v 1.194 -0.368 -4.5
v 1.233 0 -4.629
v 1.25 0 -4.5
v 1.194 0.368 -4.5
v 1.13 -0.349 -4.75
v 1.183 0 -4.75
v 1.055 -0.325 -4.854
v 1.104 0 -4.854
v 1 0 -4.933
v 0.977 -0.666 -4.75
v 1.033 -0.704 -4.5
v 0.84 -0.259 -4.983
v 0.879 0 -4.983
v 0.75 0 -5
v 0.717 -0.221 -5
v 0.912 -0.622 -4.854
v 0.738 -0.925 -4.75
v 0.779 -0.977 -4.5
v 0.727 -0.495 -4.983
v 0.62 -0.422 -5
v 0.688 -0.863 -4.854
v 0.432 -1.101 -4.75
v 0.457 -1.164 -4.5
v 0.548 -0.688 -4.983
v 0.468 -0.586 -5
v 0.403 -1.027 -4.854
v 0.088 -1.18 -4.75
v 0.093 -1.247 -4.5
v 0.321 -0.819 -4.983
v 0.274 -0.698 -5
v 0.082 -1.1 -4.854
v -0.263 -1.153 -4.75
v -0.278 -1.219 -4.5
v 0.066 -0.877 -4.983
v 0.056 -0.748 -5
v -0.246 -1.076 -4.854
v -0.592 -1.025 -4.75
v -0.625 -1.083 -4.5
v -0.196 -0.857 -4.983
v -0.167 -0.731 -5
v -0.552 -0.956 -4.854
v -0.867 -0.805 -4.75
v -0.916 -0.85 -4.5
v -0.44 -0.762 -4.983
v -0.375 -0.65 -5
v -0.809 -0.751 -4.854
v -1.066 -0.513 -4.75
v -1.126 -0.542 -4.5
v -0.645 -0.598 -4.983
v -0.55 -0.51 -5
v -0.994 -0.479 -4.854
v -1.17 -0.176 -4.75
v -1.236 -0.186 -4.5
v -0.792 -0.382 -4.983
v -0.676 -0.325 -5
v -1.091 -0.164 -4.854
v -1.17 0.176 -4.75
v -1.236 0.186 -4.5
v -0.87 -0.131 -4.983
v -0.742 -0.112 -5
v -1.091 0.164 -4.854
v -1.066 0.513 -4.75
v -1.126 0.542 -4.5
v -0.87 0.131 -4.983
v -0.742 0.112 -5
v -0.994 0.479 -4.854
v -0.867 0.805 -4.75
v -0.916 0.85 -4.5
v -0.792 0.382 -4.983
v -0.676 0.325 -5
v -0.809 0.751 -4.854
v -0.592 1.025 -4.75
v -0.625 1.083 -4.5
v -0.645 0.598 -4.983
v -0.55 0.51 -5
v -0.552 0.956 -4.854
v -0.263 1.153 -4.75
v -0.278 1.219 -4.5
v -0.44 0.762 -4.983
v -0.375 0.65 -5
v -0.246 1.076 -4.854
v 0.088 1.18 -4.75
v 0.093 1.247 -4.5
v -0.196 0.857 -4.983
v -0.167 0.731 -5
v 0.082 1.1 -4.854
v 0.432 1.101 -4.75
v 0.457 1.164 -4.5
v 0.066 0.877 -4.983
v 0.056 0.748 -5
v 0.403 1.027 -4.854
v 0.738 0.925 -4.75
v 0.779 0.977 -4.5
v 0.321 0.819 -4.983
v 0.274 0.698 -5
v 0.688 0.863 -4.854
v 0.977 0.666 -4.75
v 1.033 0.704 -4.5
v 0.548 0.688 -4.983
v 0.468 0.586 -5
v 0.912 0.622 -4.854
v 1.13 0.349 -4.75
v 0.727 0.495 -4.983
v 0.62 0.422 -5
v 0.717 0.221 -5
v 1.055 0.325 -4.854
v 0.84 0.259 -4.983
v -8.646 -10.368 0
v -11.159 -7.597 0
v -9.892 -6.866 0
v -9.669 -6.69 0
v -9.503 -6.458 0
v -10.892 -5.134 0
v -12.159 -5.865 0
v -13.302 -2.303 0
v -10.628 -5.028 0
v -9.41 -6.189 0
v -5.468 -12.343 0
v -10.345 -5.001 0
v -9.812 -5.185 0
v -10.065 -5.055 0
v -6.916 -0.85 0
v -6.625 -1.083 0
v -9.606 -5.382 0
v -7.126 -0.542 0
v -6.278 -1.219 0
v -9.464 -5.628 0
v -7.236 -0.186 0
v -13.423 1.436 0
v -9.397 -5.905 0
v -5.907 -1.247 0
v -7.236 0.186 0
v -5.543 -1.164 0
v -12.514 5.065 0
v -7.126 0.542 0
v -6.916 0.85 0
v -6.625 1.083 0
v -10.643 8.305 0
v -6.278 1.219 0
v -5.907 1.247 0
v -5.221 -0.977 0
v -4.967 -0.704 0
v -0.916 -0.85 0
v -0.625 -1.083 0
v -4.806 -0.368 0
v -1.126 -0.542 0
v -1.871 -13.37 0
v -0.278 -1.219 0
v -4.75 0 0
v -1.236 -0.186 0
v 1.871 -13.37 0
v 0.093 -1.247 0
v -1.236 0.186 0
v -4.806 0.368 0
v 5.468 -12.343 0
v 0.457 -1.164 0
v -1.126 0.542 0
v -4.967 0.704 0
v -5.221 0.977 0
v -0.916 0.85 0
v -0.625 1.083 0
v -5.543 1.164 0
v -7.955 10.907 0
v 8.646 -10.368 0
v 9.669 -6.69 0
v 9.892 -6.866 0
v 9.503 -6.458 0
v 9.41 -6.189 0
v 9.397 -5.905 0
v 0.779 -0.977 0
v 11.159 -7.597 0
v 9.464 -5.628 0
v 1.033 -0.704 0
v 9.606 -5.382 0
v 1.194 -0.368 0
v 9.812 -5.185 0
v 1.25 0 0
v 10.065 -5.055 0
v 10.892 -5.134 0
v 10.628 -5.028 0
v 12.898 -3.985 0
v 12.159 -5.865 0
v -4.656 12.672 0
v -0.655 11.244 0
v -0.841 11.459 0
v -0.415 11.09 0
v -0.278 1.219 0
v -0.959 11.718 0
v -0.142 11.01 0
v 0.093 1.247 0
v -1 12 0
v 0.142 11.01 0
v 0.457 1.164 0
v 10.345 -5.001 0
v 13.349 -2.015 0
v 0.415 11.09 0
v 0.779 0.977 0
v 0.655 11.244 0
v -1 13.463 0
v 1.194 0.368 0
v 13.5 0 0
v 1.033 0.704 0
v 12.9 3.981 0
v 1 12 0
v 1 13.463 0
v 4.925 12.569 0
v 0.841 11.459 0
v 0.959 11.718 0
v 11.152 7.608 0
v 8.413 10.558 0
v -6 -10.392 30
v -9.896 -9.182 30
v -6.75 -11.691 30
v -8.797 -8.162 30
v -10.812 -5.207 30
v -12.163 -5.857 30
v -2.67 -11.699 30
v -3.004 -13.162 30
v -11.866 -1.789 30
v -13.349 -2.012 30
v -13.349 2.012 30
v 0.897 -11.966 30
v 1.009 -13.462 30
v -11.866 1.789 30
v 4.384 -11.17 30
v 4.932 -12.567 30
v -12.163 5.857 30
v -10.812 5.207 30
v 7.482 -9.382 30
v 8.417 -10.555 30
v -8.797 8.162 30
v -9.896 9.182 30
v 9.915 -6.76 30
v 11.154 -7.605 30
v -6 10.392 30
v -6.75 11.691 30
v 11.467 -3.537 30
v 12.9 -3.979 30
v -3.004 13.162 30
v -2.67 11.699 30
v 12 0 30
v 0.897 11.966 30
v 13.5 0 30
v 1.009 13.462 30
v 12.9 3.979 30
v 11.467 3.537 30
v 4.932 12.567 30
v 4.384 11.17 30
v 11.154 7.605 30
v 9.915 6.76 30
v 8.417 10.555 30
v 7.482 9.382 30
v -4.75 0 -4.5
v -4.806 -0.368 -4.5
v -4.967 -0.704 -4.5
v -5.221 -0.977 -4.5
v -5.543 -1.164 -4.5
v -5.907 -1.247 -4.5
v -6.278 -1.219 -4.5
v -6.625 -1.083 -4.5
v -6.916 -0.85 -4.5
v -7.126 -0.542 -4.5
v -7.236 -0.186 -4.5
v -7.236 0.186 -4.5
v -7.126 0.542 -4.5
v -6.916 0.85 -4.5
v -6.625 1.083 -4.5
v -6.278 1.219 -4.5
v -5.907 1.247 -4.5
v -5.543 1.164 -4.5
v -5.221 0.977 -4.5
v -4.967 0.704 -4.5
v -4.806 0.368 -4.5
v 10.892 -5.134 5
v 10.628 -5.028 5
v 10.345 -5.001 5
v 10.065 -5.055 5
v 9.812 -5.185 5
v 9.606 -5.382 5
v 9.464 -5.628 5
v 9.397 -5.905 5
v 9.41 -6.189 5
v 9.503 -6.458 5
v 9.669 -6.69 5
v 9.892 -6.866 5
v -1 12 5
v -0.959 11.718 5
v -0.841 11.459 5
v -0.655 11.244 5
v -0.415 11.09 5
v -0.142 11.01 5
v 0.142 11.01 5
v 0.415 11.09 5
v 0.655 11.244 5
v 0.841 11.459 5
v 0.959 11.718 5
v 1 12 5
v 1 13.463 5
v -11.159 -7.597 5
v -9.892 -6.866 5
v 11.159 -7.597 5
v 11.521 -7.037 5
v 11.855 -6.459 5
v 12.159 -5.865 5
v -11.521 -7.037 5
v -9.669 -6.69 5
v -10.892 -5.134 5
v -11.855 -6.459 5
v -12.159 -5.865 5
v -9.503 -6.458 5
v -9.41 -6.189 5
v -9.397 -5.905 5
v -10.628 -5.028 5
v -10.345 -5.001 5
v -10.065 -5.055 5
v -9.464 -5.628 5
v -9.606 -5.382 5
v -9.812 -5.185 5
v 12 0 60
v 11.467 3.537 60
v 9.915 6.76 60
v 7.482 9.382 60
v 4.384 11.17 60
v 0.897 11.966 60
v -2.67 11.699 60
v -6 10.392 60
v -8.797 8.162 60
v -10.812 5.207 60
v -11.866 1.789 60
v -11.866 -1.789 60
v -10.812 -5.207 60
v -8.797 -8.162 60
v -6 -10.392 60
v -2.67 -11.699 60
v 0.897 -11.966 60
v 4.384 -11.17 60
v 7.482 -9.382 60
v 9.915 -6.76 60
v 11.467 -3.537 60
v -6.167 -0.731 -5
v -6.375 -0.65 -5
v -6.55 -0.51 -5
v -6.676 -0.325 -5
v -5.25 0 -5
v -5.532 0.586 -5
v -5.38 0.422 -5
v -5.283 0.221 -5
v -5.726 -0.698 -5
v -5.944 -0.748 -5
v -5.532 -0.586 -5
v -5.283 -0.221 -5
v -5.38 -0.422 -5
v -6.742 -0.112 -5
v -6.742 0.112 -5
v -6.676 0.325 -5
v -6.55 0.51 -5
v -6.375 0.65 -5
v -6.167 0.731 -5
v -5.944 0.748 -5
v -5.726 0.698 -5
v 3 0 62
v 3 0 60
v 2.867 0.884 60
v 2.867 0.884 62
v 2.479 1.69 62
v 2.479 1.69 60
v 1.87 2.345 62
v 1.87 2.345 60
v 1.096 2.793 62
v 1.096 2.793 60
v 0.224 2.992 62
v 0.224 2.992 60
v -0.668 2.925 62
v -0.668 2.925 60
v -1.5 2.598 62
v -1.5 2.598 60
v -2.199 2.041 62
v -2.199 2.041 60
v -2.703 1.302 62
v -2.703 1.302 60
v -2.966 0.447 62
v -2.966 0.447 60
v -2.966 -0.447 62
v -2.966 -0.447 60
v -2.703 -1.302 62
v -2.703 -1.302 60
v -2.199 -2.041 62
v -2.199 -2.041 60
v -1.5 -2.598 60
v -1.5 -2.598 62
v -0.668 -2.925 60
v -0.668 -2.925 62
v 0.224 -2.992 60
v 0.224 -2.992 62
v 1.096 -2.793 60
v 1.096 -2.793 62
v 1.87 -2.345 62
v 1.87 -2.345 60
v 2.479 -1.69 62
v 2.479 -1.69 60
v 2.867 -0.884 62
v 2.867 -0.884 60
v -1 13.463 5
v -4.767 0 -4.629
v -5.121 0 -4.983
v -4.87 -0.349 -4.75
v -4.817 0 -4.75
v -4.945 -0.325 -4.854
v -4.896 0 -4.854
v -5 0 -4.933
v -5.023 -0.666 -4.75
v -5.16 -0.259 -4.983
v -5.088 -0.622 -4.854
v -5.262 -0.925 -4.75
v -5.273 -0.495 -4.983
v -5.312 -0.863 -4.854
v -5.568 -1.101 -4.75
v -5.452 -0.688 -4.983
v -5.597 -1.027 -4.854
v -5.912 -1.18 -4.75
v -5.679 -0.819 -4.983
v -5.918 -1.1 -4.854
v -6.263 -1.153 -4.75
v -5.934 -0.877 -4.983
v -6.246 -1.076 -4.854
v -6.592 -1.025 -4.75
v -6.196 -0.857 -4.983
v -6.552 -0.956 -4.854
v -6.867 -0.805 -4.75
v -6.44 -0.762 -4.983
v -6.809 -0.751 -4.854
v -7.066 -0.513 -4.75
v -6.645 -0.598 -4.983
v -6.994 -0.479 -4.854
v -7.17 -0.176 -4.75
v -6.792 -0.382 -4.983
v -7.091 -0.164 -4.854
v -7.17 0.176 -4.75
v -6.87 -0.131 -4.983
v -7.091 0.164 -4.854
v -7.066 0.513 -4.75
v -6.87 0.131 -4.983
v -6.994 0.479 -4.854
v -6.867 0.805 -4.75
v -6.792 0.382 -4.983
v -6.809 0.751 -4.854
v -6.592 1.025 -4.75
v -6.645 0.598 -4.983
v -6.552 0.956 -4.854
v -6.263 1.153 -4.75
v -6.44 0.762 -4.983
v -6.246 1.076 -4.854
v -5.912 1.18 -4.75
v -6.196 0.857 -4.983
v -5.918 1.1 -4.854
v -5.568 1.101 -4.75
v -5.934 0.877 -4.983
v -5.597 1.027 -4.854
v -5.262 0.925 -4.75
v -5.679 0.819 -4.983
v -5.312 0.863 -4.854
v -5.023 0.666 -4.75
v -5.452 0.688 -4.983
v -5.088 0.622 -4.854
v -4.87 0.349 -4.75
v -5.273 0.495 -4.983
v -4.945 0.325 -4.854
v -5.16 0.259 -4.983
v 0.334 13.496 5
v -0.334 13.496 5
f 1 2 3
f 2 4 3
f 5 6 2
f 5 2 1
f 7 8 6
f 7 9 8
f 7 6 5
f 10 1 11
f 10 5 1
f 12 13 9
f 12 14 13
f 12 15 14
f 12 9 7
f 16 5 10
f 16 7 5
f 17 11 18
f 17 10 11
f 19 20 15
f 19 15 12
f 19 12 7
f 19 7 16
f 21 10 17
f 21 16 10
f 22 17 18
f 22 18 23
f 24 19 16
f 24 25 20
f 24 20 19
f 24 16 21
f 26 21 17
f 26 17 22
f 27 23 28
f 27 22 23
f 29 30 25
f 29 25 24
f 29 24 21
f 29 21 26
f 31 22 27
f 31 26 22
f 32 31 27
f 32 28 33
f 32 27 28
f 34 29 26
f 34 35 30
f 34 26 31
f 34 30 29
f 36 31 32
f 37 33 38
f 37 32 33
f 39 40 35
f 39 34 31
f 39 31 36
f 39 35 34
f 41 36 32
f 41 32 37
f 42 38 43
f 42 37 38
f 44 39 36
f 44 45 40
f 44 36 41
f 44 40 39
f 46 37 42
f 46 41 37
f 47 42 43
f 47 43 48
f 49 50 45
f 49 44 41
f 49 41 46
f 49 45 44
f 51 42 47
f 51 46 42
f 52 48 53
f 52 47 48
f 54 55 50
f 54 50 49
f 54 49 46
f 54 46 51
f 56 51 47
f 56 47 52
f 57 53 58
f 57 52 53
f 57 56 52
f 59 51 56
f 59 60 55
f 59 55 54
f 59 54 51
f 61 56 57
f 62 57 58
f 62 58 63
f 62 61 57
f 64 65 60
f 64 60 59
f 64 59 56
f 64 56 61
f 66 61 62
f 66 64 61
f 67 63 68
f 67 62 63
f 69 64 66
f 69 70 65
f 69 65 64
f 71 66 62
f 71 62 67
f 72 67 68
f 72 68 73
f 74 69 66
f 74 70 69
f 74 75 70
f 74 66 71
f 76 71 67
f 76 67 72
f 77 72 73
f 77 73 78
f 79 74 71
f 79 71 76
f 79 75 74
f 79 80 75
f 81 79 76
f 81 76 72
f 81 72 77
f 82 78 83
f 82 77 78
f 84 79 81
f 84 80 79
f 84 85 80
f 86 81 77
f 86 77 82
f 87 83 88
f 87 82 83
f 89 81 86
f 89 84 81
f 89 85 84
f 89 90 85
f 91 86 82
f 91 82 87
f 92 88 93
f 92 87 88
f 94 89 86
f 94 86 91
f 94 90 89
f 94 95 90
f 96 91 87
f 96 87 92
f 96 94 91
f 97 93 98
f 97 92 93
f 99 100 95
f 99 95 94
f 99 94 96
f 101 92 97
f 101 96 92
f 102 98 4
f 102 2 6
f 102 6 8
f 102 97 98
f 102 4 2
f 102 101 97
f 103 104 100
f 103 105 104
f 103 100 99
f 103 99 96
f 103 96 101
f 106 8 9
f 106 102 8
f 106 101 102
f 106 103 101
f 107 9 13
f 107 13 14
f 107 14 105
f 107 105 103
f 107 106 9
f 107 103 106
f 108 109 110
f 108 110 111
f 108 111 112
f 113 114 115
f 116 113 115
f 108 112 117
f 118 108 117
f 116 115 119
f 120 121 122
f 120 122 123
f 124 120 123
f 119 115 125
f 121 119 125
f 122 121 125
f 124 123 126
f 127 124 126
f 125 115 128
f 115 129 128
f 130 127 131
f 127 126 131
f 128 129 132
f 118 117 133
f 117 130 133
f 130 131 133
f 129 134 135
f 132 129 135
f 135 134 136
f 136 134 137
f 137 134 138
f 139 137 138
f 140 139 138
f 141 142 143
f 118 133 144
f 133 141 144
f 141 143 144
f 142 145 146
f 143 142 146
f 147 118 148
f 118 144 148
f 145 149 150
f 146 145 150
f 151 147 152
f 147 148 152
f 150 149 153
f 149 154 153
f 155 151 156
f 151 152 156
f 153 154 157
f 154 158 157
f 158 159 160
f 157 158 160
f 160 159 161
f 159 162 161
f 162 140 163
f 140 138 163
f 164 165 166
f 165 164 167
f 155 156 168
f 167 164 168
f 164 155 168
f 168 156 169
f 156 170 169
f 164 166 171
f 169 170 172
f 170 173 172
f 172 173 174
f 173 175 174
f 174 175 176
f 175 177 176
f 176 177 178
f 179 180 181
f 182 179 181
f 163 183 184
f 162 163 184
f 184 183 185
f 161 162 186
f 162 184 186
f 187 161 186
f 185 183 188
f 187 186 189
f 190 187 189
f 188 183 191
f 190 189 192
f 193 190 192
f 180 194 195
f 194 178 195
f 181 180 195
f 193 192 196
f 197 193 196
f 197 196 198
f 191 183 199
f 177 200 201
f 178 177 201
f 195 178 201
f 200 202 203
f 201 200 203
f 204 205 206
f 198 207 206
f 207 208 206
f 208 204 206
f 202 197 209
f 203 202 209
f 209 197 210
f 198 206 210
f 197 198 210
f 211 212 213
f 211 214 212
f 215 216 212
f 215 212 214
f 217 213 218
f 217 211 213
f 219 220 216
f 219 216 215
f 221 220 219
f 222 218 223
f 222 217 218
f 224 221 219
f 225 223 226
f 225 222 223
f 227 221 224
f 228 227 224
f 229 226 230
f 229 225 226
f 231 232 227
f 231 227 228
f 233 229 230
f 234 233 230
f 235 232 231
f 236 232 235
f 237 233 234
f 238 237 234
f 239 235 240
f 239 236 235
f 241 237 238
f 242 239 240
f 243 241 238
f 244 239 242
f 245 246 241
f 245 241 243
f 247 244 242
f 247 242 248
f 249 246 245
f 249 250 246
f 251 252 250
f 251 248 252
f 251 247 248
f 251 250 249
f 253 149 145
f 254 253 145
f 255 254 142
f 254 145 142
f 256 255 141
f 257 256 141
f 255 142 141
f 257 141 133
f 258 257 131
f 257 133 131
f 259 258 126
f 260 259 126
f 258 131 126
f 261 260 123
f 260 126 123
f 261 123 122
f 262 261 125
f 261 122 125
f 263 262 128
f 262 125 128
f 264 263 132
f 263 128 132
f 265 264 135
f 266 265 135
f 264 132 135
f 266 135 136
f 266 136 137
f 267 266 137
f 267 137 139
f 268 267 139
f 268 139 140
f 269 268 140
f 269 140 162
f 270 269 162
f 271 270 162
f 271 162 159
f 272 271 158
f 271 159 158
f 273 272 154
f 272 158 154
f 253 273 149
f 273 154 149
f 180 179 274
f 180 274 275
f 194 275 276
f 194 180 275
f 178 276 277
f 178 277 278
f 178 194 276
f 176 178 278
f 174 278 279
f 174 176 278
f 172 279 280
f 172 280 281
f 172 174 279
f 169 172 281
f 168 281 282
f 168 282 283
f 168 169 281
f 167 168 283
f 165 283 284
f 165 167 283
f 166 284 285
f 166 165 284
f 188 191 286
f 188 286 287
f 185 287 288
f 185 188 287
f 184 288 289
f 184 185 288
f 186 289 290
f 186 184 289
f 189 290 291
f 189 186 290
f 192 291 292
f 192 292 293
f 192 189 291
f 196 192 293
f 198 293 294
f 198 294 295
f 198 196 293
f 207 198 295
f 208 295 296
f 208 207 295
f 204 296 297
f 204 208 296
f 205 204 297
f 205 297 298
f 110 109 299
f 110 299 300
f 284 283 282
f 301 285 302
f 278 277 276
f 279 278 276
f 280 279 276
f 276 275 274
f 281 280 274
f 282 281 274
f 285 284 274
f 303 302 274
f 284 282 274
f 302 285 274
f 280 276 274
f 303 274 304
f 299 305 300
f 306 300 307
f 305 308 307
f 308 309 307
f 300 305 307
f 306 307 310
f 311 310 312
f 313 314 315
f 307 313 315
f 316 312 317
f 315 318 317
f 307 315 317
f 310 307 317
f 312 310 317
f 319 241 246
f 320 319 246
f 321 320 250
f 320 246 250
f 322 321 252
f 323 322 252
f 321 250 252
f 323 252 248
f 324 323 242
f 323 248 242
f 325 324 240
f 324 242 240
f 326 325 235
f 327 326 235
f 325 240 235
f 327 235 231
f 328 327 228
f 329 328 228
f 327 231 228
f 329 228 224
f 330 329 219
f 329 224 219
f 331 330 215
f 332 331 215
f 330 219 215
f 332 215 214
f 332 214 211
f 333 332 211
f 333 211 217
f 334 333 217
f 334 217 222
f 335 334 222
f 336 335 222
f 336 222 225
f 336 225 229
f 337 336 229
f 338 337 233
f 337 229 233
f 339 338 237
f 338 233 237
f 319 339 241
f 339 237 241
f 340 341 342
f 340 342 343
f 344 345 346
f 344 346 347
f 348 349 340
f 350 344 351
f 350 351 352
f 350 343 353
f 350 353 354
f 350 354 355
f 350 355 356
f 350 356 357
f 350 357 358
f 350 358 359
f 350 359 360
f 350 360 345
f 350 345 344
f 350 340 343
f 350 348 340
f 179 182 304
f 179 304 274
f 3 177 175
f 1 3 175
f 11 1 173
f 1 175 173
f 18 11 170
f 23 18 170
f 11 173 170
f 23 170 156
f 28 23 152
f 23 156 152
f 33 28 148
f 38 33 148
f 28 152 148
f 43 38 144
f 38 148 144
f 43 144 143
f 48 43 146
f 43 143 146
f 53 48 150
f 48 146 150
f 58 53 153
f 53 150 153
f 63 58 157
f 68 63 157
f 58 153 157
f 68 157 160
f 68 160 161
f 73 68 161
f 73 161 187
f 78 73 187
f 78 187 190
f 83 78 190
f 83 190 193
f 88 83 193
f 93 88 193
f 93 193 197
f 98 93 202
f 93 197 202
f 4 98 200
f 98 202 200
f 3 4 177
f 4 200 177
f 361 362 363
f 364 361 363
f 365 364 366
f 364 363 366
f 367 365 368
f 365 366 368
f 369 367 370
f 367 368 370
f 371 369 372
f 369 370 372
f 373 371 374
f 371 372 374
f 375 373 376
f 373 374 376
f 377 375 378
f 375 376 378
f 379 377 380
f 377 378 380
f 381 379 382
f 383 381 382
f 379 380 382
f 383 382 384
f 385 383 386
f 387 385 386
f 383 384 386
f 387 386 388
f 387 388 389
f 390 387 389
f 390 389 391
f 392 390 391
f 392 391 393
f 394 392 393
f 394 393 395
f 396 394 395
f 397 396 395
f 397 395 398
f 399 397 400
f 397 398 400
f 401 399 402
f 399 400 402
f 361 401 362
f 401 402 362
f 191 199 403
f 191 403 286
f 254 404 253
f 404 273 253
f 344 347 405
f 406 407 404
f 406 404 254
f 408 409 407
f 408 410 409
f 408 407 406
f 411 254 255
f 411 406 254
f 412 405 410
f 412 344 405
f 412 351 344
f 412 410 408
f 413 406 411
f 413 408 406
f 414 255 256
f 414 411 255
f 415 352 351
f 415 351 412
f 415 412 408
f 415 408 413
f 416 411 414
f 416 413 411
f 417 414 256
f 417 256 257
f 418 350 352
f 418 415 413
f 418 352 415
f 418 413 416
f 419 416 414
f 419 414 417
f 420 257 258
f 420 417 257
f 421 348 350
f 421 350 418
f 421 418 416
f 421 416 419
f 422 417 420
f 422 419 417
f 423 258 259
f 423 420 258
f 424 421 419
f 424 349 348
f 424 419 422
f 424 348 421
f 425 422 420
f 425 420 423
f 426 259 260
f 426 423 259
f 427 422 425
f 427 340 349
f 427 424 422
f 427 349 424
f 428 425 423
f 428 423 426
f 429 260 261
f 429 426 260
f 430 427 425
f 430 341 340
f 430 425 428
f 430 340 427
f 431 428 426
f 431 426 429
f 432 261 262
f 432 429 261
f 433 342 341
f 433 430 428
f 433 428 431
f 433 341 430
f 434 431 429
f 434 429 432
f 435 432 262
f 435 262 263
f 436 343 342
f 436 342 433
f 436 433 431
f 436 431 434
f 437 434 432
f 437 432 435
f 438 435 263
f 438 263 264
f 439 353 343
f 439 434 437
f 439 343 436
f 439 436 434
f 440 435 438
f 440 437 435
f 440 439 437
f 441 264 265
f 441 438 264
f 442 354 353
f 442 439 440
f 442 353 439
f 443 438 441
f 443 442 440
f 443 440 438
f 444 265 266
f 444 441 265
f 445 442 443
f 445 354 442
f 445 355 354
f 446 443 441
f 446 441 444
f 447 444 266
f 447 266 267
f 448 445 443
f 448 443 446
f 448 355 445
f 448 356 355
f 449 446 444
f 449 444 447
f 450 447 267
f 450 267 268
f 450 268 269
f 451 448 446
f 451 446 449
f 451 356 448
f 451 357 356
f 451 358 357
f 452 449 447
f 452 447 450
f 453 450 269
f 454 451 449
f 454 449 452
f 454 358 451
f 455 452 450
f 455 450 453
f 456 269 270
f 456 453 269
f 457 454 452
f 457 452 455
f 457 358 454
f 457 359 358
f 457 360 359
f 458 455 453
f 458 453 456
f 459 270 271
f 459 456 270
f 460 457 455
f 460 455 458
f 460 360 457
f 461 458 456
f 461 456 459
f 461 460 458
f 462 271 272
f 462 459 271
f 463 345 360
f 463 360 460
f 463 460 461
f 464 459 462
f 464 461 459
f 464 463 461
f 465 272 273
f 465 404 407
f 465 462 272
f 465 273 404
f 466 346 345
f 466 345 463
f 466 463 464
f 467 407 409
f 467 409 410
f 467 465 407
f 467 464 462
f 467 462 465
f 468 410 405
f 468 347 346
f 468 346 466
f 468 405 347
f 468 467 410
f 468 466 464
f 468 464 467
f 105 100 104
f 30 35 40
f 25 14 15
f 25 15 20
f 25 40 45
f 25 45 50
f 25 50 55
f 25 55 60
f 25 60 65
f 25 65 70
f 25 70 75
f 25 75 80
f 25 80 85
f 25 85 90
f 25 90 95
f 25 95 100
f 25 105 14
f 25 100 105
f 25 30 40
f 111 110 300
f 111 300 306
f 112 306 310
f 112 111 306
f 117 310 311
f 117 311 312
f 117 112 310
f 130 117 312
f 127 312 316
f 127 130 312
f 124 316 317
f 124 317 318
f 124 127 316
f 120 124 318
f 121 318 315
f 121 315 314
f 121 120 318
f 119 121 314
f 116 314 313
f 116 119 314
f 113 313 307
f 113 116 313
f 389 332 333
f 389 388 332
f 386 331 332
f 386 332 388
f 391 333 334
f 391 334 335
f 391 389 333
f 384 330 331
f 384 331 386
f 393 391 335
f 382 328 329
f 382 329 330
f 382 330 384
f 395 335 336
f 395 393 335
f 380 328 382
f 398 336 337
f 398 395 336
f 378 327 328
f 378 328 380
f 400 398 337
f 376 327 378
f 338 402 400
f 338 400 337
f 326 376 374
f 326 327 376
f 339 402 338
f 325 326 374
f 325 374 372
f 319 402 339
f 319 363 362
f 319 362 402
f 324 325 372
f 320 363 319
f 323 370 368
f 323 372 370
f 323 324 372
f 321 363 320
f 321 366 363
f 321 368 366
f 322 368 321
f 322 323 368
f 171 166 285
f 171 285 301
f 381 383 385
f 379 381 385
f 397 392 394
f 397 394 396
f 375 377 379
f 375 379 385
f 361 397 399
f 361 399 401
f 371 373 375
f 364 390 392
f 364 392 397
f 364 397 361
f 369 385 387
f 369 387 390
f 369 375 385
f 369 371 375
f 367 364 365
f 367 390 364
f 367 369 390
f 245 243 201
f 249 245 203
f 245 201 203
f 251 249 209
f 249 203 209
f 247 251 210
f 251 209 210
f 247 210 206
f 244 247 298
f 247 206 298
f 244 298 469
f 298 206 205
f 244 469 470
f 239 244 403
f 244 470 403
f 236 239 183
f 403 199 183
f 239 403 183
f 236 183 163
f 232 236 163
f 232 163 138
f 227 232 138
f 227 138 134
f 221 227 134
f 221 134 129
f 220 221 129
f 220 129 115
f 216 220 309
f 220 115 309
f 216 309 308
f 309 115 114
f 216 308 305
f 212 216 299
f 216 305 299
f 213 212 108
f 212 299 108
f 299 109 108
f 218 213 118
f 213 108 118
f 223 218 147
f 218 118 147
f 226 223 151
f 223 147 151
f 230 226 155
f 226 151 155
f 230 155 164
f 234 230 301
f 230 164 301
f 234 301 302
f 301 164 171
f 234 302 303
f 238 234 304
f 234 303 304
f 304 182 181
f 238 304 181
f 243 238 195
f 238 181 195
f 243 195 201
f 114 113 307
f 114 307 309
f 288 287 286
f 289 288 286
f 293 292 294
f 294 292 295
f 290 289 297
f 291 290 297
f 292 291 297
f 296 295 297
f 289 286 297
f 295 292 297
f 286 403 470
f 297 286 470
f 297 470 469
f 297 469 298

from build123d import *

# Parameters (mm, degrees)
SKETCH_1_R          = 13.5
EXTRUDE_1_DEPTH     = 30
SKETCH_2_R          = 12
EXTRUDE_2_DEPTH     = 30
SKETCH_3_R          = 3
EXTRUDE_3_DEPTH     = 2
CUT_EXTRUDE_1_DEPTH = 5
SKETCH_5_R          = 1.25
EXTRUDE_4_DEPTH     = 5
FILLET_1_R          = 0.5


with BuildPart() as part:
    # 草图1 → 凸台-拉伸1 (new body)
    with BuildSketch(Plane.XY):
        Circle(SKETCH_1_R)
    extrude(amount=EXTRUDE_1_DEPTH)

    # 草图2 → 凸台-拉伸2 (add)
    with BuildSketch(Plane.XY.offset(30)):
        Circle(SKETCH_2_R)
    extrude(amount=EXTRUDE_2_DEPTH)

    # 草图3 → 凸台-拉伸3 (add)
    with BuildSketch(Plane.XY.offset(60)):
        Circle(SKETCH_3_R)
    extrude(amount=EXTRUDE_3_DEPTH)

    # 草图4 → 切除-拉伸1 (cut)
    with BuildSketch(Plane(origin=(0, 0, 0), x_dir=(-1, 0, 0), z_dir=(0, 0, -1))):
        with BuildLine():
            Line((-1, 12), (-1, 13.978745528))
            Line((-1, 13.978745528), (1, 13.978745528))
            Line((1, 13.978745528), (1, 12))
            ThreePointArc((1, 12), (0, 11), (-1, 12))
        make_face()
        with BuildLine():
            Line((10.892304845, -5.133974596), (12.60594874, -6.12334736))
            Line((12.60594874, -6.12334736), (11.60594874, -7.855398168))
            Line((11.60594874, -7.855398168), (9.892304845, -6.866025404))
            ThreePointArc((9.892304845, -6.866025404), (9.526279442, -5.5), (10.892304845, -5.133974596))
        make_face()
        with BuildLine():
            Line((-9.892304845, -6.866025404), (-11.60594874, -7.855398168))
            Line((-11.60594874, -7.855398168), (-12.60594874, -6.12334736))
            Line((-12.60594874, -6.12334736), (-10.892304845, -5.133974596))
            ThreePointArc((-10.892304845, -5.133974596), (-9.526279442, -5.5), (-9.892304845, -6.866025404))
        make_face()
    extrude(amount=-CUT_EXTRUDE_1_DEPTH, mode=Mode.SUBTRACT)

    # 草图5 → 凸台-拉伸4 (add)
    with BuildSketch(Plane(origin=(0, 0, 0), x_dir=(-1, 0, 0), z_dir=(0, 0, -1))):
        with Locations(Location((0, 0, 0), (0, 0, 180))):
            Circle(SKETCH_5_R)
        with Locations(Location((6, 0, 0), (0, 0, 180))):
            Circle(SKETCH_5_R)
    extrude(amount=EXTRUDE_4_DEPTH)

    # 圆角1
    fillet_1_edges = [part.edges().sort_by_distance(p)[0] for p in [
        (-1.25, 0, -5),
        (-7.25, 0, -5),
    ]]
    fillet(fillet_1_edges, radius=FILLET_1_R)


solid = part.part
